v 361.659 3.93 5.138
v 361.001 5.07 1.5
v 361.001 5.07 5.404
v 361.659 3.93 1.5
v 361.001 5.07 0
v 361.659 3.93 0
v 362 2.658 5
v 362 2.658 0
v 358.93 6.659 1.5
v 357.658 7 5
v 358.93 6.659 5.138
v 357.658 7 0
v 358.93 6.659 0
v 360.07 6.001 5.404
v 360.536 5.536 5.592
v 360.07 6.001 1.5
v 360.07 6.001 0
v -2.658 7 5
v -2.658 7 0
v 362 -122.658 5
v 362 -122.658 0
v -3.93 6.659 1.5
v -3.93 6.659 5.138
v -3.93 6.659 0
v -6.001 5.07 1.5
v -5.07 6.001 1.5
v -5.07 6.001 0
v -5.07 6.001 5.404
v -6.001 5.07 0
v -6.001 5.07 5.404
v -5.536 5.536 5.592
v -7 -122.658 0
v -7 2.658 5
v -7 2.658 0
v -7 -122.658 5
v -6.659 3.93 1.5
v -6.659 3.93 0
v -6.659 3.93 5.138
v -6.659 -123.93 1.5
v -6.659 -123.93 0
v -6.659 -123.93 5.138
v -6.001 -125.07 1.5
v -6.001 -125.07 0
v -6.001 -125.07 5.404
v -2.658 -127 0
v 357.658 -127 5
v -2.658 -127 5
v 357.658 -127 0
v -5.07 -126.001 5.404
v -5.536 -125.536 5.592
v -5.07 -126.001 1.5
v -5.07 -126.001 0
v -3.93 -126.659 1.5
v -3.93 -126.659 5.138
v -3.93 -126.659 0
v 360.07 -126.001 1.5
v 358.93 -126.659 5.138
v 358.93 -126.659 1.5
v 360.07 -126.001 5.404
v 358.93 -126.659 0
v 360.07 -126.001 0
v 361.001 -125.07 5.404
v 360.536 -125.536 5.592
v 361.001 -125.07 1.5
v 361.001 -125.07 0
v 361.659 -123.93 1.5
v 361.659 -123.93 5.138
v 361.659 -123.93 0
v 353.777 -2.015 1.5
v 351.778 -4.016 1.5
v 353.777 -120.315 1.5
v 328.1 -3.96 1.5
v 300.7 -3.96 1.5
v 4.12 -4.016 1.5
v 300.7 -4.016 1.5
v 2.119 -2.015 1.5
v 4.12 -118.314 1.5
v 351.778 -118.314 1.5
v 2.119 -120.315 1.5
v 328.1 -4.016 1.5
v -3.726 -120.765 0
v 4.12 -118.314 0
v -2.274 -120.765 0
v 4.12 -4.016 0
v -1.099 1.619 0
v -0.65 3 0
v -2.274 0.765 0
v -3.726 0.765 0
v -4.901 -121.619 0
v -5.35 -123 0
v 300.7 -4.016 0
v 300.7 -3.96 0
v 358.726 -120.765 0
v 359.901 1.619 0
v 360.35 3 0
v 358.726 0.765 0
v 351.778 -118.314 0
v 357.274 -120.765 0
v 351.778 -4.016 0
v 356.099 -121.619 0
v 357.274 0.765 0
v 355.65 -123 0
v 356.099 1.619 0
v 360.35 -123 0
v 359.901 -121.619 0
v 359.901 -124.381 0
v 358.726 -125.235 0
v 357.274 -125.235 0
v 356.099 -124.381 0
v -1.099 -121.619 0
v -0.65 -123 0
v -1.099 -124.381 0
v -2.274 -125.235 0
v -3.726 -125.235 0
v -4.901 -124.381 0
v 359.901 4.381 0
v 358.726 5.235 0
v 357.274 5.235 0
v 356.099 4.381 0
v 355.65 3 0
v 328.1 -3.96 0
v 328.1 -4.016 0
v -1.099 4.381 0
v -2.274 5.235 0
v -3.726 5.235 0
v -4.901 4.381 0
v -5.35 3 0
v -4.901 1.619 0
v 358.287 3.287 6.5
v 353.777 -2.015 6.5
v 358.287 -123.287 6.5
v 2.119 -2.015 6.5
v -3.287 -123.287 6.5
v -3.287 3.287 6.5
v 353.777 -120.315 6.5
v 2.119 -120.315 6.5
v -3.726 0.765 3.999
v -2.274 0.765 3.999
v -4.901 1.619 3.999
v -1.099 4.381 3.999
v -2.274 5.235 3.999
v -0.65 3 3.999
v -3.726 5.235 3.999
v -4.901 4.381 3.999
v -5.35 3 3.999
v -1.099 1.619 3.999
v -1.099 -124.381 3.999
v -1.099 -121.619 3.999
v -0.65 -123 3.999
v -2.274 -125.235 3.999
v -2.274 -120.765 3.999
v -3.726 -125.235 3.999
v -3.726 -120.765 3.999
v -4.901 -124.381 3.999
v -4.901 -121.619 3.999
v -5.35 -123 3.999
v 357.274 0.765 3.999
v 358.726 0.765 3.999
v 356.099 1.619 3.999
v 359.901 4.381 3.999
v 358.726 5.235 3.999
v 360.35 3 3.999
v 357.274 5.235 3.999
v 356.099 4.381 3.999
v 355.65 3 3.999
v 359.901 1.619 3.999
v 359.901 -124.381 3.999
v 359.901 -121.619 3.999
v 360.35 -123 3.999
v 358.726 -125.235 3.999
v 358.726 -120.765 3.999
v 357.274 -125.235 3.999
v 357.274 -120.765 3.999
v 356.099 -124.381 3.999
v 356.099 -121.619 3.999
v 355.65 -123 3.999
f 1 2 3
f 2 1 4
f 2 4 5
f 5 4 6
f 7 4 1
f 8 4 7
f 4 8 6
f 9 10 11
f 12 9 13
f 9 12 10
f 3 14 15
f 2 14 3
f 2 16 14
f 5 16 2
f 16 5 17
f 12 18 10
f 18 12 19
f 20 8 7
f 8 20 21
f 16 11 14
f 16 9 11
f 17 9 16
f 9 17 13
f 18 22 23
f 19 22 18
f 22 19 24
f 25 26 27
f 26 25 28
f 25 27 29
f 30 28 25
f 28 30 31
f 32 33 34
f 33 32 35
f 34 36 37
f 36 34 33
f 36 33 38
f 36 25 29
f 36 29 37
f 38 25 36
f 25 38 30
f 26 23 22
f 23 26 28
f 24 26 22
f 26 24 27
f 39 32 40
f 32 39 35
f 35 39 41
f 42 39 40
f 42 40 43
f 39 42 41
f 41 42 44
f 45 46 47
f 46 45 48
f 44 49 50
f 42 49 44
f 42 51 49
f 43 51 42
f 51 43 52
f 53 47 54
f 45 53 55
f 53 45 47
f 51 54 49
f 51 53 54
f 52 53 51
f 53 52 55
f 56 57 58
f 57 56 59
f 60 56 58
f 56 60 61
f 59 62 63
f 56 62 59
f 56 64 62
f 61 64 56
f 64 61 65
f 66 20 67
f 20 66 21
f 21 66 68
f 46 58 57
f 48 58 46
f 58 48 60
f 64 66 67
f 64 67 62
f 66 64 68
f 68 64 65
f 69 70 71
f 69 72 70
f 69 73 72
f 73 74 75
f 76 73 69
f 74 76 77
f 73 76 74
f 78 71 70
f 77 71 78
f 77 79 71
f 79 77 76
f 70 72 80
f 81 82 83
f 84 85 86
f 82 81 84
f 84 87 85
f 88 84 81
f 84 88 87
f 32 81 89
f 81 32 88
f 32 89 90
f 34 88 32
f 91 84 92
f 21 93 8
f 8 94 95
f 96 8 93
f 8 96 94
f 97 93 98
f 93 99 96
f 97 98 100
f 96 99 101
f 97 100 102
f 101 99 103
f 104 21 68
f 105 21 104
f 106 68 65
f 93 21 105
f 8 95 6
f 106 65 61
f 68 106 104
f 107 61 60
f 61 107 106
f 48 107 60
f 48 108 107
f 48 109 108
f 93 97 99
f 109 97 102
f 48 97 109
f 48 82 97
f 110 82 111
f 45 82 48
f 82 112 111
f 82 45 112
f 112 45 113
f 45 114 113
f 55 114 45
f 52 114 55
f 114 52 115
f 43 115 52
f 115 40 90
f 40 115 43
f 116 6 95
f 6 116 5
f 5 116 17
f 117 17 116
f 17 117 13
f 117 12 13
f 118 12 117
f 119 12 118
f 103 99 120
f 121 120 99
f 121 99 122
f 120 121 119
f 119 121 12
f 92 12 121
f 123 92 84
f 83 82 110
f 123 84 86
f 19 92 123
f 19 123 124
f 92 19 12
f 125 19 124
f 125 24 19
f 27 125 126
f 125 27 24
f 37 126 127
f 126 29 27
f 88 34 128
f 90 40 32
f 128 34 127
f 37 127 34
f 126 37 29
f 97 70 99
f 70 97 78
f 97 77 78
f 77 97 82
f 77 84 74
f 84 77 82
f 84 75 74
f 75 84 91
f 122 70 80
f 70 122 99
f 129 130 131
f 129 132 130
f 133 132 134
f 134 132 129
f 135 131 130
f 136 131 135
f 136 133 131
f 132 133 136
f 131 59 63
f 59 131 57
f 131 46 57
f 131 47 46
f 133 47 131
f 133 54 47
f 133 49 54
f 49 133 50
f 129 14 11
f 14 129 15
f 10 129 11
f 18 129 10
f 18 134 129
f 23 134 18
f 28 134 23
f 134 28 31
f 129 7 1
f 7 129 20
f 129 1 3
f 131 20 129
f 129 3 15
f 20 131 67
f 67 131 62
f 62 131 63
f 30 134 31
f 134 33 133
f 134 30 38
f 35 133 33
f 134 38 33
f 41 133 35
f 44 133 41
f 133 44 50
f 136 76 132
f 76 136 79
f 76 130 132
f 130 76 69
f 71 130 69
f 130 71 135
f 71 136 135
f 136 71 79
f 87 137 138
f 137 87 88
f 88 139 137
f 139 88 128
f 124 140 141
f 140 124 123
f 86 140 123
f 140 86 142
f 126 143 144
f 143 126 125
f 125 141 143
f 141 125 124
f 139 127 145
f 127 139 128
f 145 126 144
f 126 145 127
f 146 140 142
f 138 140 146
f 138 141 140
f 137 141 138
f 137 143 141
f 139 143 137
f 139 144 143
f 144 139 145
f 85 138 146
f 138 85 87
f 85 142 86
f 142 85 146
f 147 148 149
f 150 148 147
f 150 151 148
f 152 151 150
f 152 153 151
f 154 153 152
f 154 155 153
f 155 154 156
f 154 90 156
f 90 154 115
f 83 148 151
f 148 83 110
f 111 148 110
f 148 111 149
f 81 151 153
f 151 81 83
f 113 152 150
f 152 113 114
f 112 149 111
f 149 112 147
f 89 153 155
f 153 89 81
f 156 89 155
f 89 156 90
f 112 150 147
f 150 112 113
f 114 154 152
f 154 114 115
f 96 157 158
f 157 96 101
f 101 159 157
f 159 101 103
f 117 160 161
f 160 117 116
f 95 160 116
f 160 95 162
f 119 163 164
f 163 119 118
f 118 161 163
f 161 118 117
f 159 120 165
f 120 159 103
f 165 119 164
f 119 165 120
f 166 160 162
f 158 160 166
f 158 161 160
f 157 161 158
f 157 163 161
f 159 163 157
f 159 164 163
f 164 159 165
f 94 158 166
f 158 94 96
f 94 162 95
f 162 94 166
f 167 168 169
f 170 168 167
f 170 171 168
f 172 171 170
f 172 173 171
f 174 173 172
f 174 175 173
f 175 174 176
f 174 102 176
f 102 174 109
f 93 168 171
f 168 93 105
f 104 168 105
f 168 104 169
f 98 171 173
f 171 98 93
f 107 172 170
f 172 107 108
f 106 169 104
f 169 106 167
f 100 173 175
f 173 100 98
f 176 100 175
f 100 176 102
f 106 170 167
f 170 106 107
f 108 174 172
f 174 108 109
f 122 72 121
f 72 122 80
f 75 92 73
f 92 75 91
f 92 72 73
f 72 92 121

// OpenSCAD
// Units: mm
// Copyright: @Cyao 2025

include <BOSL/constants.scad>
use <BOSL/shapes.scad>
include <common.scad>

// TODO: Acrylic for OLED

module key_holes() {
	translate([KEY_OFFSET_X, -KEY_OFFSET_Y, 0])
	difference() {
		translate([0.001, -KEYS_HEIGHT+0.001, 0])
		square([KEYS_WIDTH-0.002, KEYS_HEIGHT-0.002]);

		import(file=PLATE_FILE_NAME);
	}
}


// Base of the plate with holes
module base() {
	difference() {
		translate([-WALL_THICKNESS, -PCB_HEIGHT-WALL_THICKNESS, 0])
		cuboid([PCB_WIDTH+WALL_THICKNESS*2, PCB_HEIGHT+WALL_THICKNESS*2, PLATE_THICKNESS], fillet=5, edges=EDGE_FR_RT+EDGE_BK_RT+EDGE_FR_LF+EDGE_BK_LF, center=false, $fn=24);

		translate([0, 0, -0.001])
		linear_extrude(height=PLATE_THICKNESS+0.002, convexity=50)
		key_holes();
	}
}

module chamfer() {
	translate([0, -TOTAL_HEIGHT+WALL_THICKNESS, TOP_EXTEND])
	rotate(CHAMFER_ANGLE, [1, 0, 0])
	translate([-WALL_THICKNESS-25, -40, 0])
	cube([TOTAL_WIDTH + 50, 80, 10]);

	translate([0, WALL_THICKNESS, TOP_EXTEND])
	rotate(CHAMFER_ANGLE, [-1, 0, 0])
	translate([-WALL_THICKNESS-25, -40, 0])
	cube([TOTAL_WIDTH + 50, 80, 10]);

	translate([TOTAL_WIDTH-WALL_THICKNESS, 0, TOP_EXTEND])
	rotate(CHAMFER_ANGLE, [0, 1, 0])
	translate([-40, -TOTAL_HEIGHT-25+WALL_THICKNESS, 0])
	cube([80, TOTAL_HEIGHT + 50, 10]);

	translate([-WALL_THICKNESS, 0, TOP_EXTEND])
	rotate(CHAMFER_ANGLE, [0, -1, 0])
	translate([-40, -TOTAL_HEIGHT-25+WALL_THICKNESS, 0])
	cube([80, TOTAL_HEIGHT + 50, 10]);
}

module fillet() {
	translate([-25, WALL_THICKNESS, TOP_EXTEND+PLATE_THICKNESS])
	interior_fillet(l=TOTAL_WIDTH + 50, r=FILLET_RADIUS, orient=ORIENT_X_180, align=V_RIGHT, $fn=40);

	translate([0, -PCB_HEIGHT-WALL_THICKNESS, TOP_EXTEND+PLATE_THICKNESS])
	rotate(180, [0, 0, 1])
	translate([-TOTAL_WIDTH - 25, 0, 0])
	interior_fillet(l=TOTAL_WIDTH + 50, r=FILLET_RADIUS, orient=ORIENT_X_180, align=V_RIGHT, $fn=40);

	translate([-WALL_THICKNESS, -PCB_HEIGHT-WALL_THICKNESS-25, TOP_EXTEND+PLATE_THICKNESS])
	rotate(90, [0, 0, 1])
	interior_fillet(l=TOTAL_HEIGHT + 50, r=FILLET_RADIUS, orient=ORIENT_X_180, align=V_RIGHT, $fn=40);

	translate([PCB_WIDTH+WALL_THICKNESS, 25+WALL_THICKNESS, TOP_EXTEND+PLATE_THICKNESS])
	rotate(270, [0, 0, 1])
	interior_fillet(l=TOTAL_HEIGHT + 50, r=FILLET_RADIUS, orient=ORIENT_X_180, align=V_RIGHT, $fn=40);
}

module edge() {
	difference() {
		translate([-WALL_THICKNESS, -PCB_HEIGHT-WALL_THICKNESS, 0])
		cuboid([PCB_WIDTH+WALL_THICKNESS*2, PCB_HEIGHT+WALL_THICKNESS*2, TOP_EXTEND], fillet=5, edges=EDGE_FR_RT+EDGE_BK_RT+EDGE_FR_LF+EDGE_BK_LF, center=false, $fn=24);

		translate([KEY_OFFSET_X, -KEY_OFFSET_Y, 0])
		translate([0, 0, -0.001])
		linear_extrude(height=TOP_EXTEND+0.002, convexity=50)
		translate([-2, -KEYS_HEIGHT-2, 0])
		square([KEYS_WIDTH-0.002+4, KEYS_HEIGHT+4], center=false);

		if (CHAMFER) {
			translate([0, 0, -PLATE_THICKNESS])
			chamfer();
		}

		if (FILLET) {
			translate([0, 0, -PLATE_THICKNESS])
			fillet();
		}
	}
}

module main_body() {
	union() {
		base();

		translate([0, 0, PLATE_THICKNESS])
		edge();
	}
}

module oled_hole() {
	translate([OLED_OFFSET_X-0.2, -OLED_OFFSET_Y-OLED_HEIGHT+0.2, -40])
	cube([OLED_WIDTH+0.4, OLED_HEIGHT+0.4, 90]);
}

module insert() {
	cylinder(h=4.0001, d=4.7, $fn=10);
}

module plate() {
	difference() {
		main_body();

		translate([-WALL_THICKNESS/2+0.5, WALL_THICKNESS/2-0.5, -0.001])
		insert();

		translate([-WALL_THICKNESS/2+0.5, -WALL_THICKNESS/2+0.5-PCB_HEIGHT, -0.001])
		insert();

		translate([PCB_WIDTH+WALL_THICKNESS/2-0.5, WALL_THICKNESS/2-0.5, -0.001])
		insert();

		translate([PCB_WIDTH+WALL_THICKNESS/2-0.5, -WALL_THICKNESS/2+0.5-PCB_HEIGHT, -0.001])
		insert();

		oled_hole();
	}
}

plate();
